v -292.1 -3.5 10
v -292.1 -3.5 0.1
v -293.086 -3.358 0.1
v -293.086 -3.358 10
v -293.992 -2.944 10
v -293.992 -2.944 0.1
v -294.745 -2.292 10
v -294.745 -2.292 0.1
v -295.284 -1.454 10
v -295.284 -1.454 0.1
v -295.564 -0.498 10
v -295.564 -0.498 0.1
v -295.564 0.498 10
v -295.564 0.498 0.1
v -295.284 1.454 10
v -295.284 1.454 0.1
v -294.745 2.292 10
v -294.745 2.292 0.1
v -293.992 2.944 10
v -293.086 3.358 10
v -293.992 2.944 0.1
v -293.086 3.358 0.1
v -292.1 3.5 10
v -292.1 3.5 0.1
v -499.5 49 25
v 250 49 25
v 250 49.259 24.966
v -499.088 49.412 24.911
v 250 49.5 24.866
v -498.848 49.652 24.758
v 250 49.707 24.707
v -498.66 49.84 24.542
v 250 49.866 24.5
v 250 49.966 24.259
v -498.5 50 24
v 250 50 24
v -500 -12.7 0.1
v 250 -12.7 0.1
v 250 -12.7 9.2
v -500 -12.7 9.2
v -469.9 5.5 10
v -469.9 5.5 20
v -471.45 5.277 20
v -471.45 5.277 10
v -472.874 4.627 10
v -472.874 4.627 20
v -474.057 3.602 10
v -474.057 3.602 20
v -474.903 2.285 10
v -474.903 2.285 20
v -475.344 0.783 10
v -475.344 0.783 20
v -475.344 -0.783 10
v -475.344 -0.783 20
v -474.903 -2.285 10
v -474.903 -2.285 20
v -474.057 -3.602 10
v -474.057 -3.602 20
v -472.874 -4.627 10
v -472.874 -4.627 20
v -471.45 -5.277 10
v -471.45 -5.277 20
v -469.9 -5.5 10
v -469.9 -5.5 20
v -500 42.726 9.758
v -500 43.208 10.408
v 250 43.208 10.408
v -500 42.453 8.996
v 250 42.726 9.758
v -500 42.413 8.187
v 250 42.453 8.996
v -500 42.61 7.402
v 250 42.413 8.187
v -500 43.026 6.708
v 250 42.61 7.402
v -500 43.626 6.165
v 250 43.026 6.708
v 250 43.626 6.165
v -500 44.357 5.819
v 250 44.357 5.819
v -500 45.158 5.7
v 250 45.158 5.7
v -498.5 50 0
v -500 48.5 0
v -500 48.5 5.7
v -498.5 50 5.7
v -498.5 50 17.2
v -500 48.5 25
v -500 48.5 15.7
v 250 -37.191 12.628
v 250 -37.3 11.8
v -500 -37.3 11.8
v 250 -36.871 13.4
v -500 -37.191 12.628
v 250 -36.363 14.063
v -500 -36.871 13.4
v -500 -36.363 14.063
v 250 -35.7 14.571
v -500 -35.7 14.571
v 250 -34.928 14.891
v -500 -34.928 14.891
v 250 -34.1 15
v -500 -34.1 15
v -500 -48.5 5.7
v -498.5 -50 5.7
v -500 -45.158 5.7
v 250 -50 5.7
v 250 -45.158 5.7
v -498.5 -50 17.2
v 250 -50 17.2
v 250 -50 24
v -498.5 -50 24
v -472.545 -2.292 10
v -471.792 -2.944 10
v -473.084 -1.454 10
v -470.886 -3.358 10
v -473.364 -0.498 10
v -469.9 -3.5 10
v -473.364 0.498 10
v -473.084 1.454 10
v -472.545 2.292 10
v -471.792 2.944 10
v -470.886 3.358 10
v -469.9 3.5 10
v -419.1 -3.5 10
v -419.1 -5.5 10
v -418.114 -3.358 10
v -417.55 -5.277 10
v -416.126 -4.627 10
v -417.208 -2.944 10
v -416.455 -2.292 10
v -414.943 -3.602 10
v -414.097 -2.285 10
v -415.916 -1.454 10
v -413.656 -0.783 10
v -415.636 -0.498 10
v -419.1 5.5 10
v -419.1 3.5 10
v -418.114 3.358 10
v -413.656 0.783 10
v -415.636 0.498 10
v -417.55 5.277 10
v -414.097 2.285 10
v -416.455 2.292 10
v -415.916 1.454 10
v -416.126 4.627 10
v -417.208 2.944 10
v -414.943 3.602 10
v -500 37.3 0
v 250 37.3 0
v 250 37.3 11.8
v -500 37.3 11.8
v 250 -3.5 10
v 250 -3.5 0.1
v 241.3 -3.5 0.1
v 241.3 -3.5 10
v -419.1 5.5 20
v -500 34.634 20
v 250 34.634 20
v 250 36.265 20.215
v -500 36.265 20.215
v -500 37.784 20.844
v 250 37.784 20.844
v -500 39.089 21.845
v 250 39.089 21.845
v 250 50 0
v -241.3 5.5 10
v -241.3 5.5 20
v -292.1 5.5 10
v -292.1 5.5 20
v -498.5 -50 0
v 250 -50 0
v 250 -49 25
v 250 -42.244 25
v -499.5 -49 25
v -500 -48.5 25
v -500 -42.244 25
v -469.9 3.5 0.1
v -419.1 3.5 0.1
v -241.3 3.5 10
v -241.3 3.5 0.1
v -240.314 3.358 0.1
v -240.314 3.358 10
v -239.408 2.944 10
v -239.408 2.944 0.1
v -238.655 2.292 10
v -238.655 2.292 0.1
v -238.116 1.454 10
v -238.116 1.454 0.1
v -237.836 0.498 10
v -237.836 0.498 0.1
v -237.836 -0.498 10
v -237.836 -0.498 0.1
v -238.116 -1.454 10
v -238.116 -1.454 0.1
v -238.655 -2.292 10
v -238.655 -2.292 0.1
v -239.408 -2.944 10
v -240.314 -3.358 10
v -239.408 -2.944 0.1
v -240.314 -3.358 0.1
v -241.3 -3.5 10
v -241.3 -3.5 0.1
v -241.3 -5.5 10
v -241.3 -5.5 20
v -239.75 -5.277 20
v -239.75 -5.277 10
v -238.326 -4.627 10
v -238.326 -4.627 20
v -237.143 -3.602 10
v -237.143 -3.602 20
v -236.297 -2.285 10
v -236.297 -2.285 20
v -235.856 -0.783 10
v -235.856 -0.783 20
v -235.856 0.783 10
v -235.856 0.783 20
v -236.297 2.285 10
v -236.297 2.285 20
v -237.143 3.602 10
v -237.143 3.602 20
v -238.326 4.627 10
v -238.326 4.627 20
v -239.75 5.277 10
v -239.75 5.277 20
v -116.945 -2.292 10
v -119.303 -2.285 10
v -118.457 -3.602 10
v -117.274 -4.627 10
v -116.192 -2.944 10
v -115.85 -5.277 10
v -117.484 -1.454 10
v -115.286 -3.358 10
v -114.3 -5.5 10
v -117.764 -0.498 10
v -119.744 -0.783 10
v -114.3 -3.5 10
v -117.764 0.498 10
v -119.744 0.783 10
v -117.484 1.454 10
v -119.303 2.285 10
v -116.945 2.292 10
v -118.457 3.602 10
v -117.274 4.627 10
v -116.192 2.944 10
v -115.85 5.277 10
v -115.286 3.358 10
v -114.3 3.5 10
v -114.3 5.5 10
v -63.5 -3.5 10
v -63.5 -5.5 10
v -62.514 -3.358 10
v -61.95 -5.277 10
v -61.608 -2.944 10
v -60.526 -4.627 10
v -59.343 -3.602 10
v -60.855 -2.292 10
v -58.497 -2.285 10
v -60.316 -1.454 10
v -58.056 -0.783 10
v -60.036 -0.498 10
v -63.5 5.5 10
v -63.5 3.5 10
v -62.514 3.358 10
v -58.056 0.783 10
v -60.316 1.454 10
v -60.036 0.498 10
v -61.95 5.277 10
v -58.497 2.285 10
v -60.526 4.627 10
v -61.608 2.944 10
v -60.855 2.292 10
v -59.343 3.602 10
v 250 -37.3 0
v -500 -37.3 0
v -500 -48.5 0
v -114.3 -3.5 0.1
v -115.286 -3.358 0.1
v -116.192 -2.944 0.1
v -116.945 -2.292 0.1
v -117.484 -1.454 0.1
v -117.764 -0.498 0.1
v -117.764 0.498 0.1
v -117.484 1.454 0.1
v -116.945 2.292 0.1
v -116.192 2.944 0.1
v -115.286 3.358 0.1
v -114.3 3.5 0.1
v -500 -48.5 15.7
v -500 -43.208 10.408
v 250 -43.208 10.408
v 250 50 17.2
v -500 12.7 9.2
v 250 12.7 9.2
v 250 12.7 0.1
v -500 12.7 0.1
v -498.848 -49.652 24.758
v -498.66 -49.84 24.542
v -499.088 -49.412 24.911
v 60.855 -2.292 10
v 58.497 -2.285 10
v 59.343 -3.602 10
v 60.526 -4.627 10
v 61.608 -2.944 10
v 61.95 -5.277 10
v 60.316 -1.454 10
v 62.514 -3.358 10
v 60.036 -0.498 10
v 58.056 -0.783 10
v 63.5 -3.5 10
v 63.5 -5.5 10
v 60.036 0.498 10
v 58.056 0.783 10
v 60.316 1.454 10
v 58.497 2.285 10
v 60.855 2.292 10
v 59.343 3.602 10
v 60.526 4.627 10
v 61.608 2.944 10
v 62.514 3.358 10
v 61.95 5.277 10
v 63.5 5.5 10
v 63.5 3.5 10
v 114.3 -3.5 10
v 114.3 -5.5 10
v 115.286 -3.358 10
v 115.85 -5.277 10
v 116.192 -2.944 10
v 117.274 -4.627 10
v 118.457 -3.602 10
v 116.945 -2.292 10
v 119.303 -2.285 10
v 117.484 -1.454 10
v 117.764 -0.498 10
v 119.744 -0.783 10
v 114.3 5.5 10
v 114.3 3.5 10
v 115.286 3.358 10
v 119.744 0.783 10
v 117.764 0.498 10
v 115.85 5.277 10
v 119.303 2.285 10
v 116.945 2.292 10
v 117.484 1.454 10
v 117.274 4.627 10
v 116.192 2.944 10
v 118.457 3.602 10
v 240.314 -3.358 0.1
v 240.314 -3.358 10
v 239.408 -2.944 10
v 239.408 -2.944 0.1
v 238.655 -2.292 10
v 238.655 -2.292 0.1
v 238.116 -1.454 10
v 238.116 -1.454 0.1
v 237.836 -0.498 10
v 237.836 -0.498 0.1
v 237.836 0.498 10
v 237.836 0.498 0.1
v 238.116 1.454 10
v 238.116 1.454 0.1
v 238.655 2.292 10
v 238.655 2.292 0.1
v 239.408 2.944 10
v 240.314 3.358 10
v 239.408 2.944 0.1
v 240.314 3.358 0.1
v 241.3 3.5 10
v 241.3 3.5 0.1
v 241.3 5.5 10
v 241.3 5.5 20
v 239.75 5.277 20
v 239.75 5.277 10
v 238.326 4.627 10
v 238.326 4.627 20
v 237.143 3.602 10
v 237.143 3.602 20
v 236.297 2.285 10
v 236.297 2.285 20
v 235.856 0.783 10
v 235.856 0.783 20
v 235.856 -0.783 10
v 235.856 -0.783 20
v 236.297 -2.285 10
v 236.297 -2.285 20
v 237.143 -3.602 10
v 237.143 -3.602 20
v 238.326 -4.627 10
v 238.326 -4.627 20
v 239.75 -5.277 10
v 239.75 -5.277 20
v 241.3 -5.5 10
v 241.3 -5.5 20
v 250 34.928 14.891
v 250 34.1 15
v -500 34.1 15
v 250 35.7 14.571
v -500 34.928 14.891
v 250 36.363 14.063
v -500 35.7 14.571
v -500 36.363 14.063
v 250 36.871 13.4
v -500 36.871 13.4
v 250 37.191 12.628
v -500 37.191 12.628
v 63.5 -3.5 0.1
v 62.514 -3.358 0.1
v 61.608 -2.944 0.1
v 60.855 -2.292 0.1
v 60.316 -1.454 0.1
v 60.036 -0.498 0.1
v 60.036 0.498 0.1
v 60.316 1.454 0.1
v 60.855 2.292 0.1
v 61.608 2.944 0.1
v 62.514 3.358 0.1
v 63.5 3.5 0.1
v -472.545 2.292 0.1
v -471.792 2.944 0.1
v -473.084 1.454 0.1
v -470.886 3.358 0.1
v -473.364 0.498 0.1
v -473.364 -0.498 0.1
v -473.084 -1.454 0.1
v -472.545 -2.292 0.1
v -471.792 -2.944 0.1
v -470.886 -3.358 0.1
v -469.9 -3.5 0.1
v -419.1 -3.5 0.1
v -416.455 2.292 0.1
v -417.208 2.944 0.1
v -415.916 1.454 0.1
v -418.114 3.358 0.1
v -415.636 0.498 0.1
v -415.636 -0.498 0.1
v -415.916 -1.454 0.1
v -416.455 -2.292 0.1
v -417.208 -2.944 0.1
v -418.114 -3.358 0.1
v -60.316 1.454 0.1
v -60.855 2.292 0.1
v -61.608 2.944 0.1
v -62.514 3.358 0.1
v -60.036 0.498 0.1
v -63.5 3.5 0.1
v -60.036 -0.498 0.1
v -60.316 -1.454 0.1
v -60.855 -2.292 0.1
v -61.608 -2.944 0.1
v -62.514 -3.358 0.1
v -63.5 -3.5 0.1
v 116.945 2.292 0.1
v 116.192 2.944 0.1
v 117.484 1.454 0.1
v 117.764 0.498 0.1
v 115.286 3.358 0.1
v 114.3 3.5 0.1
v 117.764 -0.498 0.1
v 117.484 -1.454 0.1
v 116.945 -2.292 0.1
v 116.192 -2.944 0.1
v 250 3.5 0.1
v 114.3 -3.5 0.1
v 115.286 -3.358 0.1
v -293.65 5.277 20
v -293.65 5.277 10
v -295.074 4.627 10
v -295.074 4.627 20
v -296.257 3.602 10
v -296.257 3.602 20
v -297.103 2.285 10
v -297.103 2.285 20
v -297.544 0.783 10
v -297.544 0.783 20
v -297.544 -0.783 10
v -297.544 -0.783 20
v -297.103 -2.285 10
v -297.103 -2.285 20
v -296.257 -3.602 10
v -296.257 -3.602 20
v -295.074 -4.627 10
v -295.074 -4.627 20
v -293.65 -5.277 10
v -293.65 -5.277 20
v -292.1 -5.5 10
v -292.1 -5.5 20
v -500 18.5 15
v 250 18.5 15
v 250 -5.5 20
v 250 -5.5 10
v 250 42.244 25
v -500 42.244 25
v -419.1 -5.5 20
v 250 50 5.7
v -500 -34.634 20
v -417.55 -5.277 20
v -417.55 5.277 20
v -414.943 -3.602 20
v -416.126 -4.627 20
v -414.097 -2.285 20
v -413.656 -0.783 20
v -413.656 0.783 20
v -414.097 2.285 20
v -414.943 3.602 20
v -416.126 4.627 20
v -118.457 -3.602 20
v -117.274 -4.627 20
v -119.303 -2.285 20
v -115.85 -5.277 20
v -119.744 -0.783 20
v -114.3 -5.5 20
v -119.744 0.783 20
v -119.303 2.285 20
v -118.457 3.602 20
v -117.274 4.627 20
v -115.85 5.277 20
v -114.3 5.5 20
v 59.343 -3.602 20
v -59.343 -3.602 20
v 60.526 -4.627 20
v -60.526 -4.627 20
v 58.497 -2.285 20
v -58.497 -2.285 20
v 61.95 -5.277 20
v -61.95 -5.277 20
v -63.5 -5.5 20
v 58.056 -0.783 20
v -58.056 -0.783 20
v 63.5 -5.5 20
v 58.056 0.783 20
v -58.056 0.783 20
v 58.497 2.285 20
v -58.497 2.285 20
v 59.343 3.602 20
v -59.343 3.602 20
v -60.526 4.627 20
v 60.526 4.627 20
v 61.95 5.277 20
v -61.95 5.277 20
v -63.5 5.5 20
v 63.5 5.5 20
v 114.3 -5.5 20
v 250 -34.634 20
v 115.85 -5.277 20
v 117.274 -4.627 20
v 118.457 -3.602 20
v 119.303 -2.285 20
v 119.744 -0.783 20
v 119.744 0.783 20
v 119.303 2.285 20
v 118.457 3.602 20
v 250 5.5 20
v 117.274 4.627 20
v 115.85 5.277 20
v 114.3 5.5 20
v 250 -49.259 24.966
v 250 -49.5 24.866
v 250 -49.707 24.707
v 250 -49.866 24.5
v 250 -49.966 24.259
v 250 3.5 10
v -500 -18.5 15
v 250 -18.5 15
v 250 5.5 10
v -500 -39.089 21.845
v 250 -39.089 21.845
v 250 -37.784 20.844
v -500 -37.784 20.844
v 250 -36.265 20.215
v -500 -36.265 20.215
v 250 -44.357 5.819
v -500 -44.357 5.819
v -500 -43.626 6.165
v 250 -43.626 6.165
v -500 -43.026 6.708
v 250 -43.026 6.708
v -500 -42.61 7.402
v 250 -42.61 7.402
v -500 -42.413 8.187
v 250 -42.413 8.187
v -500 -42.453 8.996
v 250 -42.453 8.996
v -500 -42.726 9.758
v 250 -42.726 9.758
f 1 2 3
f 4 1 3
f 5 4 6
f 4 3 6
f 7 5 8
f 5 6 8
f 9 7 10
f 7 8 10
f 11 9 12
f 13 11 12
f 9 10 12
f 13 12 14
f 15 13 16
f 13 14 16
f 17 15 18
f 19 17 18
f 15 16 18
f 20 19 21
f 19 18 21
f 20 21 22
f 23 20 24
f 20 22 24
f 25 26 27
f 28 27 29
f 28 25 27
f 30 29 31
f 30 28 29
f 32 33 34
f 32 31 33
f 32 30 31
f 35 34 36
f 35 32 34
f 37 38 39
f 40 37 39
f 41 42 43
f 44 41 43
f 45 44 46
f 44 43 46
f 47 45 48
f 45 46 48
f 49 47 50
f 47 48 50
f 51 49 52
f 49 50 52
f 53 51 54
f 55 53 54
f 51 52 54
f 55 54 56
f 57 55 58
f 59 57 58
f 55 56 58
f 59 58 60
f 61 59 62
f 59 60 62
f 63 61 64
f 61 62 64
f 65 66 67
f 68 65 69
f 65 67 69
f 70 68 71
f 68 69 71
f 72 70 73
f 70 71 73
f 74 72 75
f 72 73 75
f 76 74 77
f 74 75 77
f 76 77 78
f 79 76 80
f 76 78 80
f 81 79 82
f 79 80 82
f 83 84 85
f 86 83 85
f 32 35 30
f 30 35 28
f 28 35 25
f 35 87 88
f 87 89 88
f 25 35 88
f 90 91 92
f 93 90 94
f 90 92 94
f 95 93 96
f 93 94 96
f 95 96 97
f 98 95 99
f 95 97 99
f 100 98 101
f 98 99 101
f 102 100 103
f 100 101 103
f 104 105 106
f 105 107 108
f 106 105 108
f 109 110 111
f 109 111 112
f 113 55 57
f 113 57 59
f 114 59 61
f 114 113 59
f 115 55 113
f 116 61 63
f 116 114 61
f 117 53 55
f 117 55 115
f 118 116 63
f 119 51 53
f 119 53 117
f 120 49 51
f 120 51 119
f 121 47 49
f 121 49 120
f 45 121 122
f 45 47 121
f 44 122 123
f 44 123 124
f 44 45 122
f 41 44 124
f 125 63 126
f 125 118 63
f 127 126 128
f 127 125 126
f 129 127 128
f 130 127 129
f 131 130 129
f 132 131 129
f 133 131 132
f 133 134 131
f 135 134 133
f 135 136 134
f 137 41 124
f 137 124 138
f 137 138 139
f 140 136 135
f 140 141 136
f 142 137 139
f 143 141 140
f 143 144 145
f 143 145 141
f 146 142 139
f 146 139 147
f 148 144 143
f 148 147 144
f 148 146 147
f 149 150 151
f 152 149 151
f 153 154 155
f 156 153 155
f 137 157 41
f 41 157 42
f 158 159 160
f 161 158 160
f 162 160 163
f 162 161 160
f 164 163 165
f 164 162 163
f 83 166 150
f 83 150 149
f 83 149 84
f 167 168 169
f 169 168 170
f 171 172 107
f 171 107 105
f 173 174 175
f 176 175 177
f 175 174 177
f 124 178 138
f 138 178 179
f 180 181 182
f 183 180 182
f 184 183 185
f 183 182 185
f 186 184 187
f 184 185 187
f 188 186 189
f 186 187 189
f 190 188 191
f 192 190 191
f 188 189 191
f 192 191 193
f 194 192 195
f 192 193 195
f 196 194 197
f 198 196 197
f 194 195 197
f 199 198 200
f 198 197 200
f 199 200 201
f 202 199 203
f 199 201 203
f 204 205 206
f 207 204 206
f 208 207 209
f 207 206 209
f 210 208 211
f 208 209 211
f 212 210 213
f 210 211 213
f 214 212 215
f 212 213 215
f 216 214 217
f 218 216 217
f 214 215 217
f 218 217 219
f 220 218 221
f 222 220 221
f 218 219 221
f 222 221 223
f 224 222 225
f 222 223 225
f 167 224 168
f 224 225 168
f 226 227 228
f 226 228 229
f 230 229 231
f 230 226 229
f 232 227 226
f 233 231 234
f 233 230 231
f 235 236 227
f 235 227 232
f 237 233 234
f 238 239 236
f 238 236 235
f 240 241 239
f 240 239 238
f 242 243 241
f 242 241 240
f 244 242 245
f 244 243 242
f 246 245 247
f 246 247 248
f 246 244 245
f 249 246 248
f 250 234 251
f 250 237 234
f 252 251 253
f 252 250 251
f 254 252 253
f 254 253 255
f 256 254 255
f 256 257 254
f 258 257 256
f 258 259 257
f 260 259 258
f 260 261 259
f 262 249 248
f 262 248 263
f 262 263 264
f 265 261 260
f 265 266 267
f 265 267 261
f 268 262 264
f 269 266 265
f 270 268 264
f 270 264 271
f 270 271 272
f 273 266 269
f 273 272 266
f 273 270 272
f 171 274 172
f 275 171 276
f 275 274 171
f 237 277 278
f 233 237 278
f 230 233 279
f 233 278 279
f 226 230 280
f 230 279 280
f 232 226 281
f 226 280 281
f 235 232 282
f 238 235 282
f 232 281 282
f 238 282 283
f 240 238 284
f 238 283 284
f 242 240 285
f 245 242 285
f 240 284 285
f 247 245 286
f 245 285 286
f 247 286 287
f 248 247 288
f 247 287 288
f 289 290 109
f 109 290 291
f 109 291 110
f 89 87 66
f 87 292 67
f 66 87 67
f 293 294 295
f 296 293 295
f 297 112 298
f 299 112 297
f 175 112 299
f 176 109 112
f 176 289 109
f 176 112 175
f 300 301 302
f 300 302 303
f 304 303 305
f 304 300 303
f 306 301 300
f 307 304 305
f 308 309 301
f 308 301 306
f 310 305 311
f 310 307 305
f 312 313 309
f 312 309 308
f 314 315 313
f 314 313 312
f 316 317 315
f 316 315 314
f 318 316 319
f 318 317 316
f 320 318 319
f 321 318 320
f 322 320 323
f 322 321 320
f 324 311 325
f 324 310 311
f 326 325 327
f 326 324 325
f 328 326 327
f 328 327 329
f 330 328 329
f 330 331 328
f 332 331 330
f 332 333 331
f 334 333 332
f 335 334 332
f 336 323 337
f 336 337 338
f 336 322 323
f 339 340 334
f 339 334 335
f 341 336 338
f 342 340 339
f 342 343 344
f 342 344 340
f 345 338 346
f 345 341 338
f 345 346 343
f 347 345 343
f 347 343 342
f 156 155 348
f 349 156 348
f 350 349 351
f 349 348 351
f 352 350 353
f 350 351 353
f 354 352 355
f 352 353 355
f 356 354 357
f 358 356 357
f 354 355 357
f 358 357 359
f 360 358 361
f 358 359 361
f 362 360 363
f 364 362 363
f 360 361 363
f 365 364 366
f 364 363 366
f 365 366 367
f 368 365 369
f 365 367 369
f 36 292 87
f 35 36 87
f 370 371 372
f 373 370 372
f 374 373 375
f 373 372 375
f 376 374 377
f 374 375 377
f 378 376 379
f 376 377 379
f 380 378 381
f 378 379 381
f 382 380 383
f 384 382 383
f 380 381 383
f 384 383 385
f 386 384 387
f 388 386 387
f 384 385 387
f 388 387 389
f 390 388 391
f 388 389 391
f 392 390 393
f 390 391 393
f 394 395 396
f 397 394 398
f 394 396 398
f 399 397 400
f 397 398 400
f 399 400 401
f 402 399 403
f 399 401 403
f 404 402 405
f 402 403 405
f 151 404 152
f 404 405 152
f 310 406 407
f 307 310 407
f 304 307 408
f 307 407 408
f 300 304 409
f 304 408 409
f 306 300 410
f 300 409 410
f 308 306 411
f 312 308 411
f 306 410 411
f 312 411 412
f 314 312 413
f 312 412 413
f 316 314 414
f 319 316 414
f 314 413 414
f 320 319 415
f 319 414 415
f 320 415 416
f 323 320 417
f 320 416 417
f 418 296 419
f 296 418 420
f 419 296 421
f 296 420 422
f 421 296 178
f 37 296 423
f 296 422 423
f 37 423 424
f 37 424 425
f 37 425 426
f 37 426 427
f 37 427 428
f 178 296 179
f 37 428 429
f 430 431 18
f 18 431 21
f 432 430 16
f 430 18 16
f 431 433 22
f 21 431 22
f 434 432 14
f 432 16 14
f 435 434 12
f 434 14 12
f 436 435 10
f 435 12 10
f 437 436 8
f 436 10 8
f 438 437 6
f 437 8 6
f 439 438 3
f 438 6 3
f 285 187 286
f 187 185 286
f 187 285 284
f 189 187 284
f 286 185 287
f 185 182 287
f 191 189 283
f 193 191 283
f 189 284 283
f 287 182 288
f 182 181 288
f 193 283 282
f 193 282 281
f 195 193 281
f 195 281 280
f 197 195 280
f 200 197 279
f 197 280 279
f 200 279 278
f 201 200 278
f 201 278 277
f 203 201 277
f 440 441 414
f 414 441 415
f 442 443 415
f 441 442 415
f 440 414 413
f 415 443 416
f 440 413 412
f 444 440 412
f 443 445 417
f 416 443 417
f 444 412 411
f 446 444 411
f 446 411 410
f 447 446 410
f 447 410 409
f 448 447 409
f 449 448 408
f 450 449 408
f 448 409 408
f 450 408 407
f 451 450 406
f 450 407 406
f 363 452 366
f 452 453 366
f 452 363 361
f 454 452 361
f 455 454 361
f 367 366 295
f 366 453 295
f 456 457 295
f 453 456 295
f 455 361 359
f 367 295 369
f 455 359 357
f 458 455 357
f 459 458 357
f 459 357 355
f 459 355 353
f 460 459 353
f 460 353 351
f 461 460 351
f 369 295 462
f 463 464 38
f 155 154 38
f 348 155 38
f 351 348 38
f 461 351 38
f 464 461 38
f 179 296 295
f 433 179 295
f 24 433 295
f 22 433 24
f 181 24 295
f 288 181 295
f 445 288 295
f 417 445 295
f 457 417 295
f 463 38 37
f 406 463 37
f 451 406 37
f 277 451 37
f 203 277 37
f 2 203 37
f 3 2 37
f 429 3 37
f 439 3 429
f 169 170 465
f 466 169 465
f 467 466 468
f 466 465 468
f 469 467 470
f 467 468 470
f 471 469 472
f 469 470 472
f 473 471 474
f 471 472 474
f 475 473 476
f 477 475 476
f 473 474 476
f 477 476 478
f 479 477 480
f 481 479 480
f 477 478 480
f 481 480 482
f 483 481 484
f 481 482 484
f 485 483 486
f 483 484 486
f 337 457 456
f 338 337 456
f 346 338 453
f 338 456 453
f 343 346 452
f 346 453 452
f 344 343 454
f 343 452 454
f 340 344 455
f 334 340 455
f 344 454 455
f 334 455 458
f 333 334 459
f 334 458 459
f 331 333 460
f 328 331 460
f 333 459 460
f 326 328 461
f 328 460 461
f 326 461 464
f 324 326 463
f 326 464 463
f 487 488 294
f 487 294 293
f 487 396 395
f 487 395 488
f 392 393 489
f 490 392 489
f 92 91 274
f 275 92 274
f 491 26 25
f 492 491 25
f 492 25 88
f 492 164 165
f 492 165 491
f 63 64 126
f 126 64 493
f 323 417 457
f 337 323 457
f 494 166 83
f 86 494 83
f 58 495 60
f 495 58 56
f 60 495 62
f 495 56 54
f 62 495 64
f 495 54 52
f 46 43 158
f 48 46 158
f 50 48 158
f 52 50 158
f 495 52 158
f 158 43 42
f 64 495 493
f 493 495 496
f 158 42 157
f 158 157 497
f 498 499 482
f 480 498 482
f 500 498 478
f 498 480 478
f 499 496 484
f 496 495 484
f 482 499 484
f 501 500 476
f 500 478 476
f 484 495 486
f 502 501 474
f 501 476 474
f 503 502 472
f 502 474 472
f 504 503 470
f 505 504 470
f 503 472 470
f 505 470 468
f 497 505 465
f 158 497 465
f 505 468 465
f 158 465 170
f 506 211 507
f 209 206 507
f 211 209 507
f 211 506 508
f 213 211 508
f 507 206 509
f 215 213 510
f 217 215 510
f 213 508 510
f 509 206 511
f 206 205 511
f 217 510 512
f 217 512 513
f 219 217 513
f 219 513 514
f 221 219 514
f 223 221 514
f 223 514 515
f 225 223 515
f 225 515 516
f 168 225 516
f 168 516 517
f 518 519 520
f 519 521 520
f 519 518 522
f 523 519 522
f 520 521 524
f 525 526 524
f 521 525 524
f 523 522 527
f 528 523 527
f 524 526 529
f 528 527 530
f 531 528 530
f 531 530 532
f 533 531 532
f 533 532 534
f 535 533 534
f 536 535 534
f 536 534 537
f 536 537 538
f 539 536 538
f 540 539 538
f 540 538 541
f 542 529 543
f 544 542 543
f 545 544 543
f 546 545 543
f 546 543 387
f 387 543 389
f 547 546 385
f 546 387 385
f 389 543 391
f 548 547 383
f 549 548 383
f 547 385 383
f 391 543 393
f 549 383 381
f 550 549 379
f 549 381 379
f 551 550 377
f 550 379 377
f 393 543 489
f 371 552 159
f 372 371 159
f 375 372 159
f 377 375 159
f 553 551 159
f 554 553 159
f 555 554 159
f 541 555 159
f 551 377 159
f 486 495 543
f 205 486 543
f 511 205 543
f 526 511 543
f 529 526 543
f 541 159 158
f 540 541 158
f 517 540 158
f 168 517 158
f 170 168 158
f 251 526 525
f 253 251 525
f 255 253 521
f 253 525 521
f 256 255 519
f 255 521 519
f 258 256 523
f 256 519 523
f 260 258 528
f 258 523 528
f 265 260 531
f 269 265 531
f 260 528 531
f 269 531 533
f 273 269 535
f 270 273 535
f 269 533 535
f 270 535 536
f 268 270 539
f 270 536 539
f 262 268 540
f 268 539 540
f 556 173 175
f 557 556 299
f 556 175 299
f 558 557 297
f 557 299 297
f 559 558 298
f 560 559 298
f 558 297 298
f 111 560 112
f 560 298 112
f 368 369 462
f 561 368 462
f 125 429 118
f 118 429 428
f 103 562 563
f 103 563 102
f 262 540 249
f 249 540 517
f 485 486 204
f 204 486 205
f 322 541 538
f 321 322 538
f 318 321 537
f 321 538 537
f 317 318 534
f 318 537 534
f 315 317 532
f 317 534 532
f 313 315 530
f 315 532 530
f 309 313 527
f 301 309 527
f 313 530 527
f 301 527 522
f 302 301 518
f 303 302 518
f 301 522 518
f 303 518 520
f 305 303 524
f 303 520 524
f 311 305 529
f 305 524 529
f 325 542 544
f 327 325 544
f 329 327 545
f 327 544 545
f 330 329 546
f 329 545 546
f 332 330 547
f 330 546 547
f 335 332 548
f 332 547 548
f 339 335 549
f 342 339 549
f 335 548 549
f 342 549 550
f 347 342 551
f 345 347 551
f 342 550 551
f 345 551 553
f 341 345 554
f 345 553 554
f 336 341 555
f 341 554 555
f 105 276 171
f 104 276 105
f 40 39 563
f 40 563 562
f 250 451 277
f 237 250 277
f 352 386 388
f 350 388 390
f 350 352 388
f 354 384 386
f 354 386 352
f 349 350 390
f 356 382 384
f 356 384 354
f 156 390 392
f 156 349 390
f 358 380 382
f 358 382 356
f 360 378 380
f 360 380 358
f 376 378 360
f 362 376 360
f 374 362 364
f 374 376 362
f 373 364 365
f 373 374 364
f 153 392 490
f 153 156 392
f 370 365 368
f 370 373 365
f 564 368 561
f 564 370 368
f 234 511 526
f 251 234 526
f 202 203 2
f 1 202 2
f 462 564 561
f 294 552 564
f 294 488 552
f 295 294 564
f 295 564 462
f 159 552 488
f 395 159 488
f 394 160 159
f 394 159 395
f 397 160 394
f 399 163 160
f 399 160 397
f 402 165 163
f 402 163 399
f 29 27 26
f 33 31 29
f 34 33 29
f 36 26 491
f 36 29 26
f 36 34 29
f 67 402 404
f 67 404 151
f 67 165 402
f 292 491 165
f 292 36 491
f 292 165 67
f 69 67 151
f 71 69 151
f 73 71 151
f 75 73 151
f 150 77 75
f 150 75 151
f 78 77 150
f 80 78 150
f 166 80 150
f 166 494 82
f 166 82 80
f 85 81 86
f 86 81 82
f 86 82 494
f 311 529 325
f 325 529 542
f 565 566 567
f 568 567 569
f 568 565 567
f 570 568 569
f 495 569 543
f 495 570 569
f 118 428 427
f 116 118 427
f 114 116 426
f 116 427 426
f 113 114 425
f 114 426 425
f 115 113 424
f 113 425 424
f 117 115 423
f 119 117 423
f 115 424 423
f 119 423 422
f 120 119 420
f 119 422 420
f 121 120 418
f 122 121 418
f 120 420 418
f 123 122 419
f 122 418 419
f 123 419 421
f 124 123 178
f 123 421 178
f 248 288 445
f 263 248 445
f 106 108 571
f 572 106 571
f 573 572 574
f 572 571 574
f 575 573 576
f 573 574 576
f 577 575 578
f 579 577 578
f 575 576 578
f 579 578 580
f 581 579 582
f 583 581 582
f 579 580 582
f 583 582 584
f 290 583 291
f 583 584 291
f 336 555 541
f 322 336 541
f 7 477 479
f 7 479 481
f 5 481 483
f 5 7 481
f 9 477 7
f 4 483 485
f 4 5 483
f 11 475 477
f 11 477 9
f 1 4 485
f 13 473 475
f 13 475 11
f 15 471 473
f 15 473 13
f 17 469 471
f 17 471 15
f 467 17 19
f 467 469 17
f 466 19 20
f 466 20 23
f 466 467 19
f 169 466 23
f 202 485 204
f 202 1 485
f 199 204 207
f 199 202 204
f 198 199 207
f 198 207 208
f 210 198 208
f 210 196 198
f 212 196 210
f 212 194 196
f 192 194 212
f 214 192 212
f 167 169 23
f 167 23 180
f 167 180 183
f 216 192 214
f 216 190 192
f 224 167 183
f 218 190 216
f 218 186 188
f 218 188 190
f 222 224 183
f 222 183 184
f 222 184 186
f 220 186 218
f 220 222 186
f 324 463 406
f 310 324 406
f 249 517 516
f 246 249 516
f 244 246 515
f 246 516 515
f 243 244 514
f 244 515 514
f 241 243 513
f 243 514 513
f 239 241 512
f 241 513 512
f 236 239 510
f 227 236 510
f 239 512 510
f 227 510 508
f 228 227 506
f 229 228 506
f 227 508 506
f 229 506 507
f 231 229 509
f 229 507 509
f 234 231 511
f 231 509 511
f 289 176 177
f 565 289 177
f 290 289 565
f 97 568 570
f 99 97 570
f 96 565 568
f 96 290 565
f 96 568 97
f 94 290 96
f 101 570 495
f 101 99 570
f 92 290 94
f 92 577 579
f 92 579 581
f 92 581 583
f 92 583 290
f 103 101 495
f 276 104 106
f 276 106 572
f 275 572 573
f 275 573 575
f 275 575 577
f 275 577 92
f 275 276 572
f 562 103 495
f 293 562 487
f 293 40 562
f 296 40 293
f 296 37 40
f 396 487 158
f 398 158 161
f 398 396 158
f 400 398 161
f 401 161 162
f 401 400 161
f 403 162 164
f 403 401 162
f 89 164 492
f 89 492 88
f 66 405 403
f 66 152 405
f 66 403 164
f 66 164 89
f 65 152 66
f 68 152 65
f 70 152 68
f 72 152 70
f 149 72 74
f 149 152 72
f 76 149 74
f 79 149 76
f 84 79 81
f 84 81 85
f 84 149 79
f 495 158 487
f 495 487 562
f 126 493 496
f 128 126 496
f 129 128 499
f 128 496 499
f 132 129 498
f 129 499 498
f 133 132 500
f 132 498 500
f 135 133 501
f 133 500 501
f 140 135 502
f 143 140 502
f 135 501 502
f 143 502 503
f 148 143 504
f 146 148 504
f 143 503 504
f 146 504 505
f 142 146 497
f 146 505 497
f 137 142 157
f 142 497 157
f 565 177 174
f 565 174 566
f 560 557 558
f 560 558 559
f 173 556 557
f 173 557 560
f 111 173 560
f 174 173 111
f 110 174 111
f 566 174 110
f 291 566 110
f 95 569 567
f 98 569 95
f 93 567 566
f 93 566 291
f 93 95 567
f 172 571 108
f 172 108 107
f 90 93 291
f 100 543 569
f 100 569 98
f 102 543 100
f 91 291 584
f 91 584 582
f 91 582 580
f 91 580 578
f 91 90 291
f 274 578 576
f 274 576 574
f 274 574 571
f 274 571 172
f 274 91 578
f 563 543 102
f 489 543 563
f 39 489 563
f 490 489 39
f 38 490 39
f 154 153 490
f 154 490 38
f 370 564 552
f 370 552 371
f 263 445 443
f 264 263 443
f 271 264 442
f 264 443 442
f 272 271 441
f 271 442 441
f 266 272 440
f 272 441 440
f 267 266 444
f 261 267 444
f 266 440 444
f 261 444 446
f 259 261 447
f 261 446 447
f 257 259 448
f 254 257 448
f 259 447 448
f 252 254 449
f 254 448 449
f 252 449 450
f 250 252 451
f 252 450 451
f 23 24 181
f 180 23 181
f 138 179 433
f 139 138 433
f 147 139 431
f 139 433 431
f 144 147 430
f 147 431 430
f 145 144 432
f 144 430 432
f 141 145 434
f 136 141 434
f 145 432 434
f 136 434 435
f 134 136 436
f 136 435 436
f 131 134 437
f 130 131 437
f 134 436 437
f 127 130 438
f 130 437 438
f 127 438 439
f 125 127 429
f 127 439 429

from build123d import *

# Parameters (mm, degrees)
SKETCH1_W           = 1000
SKETCH1_H           = 100
BOSS_EXTRUDE1_DEPTH = 25
CUT_EXTRUDE1_DEPTH  = 1002.561281201
CUT_EXTRUDE2_DEPTH  = 1002.561281201
CUT_EXTRUDE3_DEPTH  = 1002.561281201
CUT_EXTRUDE4_DEPTH  = 1002.561281201
CUT_EXTRUDE5_DEPTH  = 10
CUT_EXTRUDE6_DEPTH  = 504.110335811
CUT_EXTRUDE7_DEPTH  = 10
CUT_EXTRUDE8_DEPTH  = 504.110335811
CUT_EXTRUDE9_DEPTH  = 10
CUT_EXTRUDE10_DEPTH = 504.110335811
CUT_EXTRUDE11_DEPTH = 10
CUT_EXTRUDE12_DEPTH = 504.110335811
CUT_EXTRUDE13_DEPTH = 10
CUT_EXTRUDE14_DEPTH = 504.110335811
CUT_EXTRUDE15_DEPTH = 10
CUT_EXTRUDE16_DEPTH = 504.110335811
CHAMFER1_SIZE       = 5.8
CHAMFER2_SIZE       = 1.5
FILLET1_R           = 1
FILLET2_R           = 3.2
FILLET3_R           = 6.3
CUT_EXTRUDE17_START = -250
CUT_EXTRUDE17_DEPTH = 250


with BuildPart() as part:
    # Sketch1 → Boss-Extrude1 (new body)
    with BuildSketch(Plane(origin=(0, 0, 0), x_dir=(-1, 0, 0), z_dir=(0, 0, -1))):
        Rectangle(SKETCH1_W, SKETCH1_H)
    extrude(amount=-BOSS_EXTRUDE1_DEPTH)

    # Sketch2 → Cut-Extrude1 (cut, through all)
    with BuildSketch(Plane(origin=(500, 0, 0), x_dir=(0, 0, -1), z_dir=(1, 0, 0))):
        Polygon((0, 37.3), (-15, 37.3), (-15, 12.7), (-0.1, 12.7), (-0.1, -12.7), (-15, -12.7), (-15, -37.3), (0, -37.3), align=None)
    extrude(amount=-CUT_EXTRUDE1_DEPTH, mode=Mode.SUBTRACT)

    # Sketch3 → Cut-Extrude2 (cut, through all)
    with BuildSketch(Plane(origin=(500, 0, 0), x_dir=(0, 0, -1), z_dir=(1, 0, 0))):
        with BuildLine():
            Line((-17.2, -50), (-5.7, -50))
            Line((-5.7, -50), (-5.7, -45.157716447))
            ThreePointArc((-5.7, -45.157716447), (-7.402384051, -42.609918665), (-10.407716447, -43.207716447))
            Line((-10.407716447, -43.207716447), (-17.2, -50))
        make_face()
    extrude(amount=-CUT_EXTRUDE2_DEPTH, mode=Mode.SUBTRACT)

    # Sketch4 → Cut-Extrude3 (cut, through all)
    with BuildSketch(Plane(origin=(500, 0, 0), x_dir=(0, 0, -1), z_dir=(1, 0, 0))):
        Polygon((-25, -42.243650814), (-20, -37.243650814), (-20, 37.243650814), (-25, 42.243650814), align=None)
    extrude(amount=-CUT_EXTRUDE3_DEPTH, mode=Mode.SUBTRACT)

    # Sketch5 → Cut-Extrude4 (cut, through all)
    with BuildSketch(Plane(origin=(500, 0, 0), x_dir=(0, 0, -1), z_dir=(1, 0, 0))):
        with BuildLine():
            Line((-5.7, 50), (-17.2, 50))
            Line((-17.2, 50), (-10.407716447, 43.207716447))
            ThreePointArc((-10.407716447, 43.207716447), (-7.402384051, 42.609918665), (-5.7, 45.157716447))
            Line((-5.7, 45.157716447), (-5.7, 50))
        make_face()
    extrude(amount=-CUT_EXTRUDE4_DEPTH, mode=Mode.SUBTRACT)

    # Sketch6 → Cut-Extrude5 (cut)
    with BuildSketch(Plane.XY.offset(20)):
        with BuildLine():
            Line((419.1, -5.5), (469.9, -5.5))
            ThreePointArc((469.9, -5.5), (475.4, 0), (469.9, 5.5))
            Line((469.9, 5.5), (419.1, 5.5))
            ThreePointArc((419.1, 5.5), (413.6, 0), (419.1, -5.5))
        make_face()
    extrude(amount=-CUT_EXTRUDE5_DEPTH, mode=Mode.SUBTRACT)

    # Sketch7 → Cut-Extrude6 (cut, through all)
    with BuildSketch(Plane(origin=(0, 0, 0.1), x_dir=(-1, 0, 0), z_dir=(0, 0, -1))):
        with BuildLine():
            Line((-469.9, -3.5), (-419.1, -3.5))
            ThreePointArc((-419.1, -3.5), (-415.6, 0), (-419.1, 3.5))
            Line((-419.1, 3.5), (-469.9, 3.5))
            ThreePointArc((-469.9, 3.5), (-473.4, 0), (-469.9, -3.5))
        make_face()
    extrude(amount=-CUT_EXTRUDE6_DEPTH, mode=Mode.SUBTRACT)

    # Sketch8 → Cut-Extrude7 (cut)
    with BuildSketch(Plane.XY.offset(20)):
        with BuildLine():
            Line((241.3, -5.5), (292.1, -5.5))
            ThreePointArc((292.1, -5.5), (297.6, 0), (292.1, 5.5))
            Line((292.1, 5.5), (241.3, 5.5))
            ThreePointArc((241.3, 5.5), (235.8, 0), (241.3, -5.5))
        make_face()
    extrude(amount=-CUT_EXTRUDE7_DEPTH, mode=Mode.SUBTRACT)

    # Sketch9 → Cut-Extrude8 (cut, through all)
    with BuildSketch(Plane(origin=(0, 0, 0.1), x_dir=(-1, 0, 0), z_dir=(0, 0, -1))):
        with BuildLine():
            Line((-292.1, -3.5), (-241.3, -3.5))
            ThreePointArc((-241.3, -3.5), (-237.8, 0), (-241.3, 3.5))
            Line((-241.3, 3.5), (-292.1, 3.5))
            ThreePointArc((-292.1, 3.5), (-295.6, 0), (-292.1, -3.5))
        make_face()
    extrude(amount=-CUT_EXTRUDE8_DEPTH, mode=Mode.SUBTRACT)

    # Sketch10 → Cut-Extrude9 (cut)
    with BuildSketch(Plane.XY.offset(20)):
        with BuildLine():
            Line((63.5, -5.5), (114.3, -5.5))
            ThreePointArc((114.3, -5.5), (119.8, 0), (114.3, 5.5))
            Line((114.3, 5.5), (63.5, 5.5))
            ThreePointArc((63.5, 5.5), (58, 0), (63.5, -5.5))
        make_face()
    extrude(amount=-CUT_EXTRUDE9_DEPTH, mode=Mode.SUBTRACT)

    # Sketch11 → Cut-Extrude10 (cut, through all)
    with BuildSketch(Plane(origin=(0, 0, 0.1), x_dir=(-1, 0, 0), z_dir=(0, 0, -1))):
        with BuildLine():
            Line((-114.3, -3.5), (-63.5, -3.5))
            ThreePointArc((-63.5, -3.5), (-60, 0), (-63.5, 3.5))
            Line((-63.5, 3.5), (-114.3, 3.5))
            ThreePointArc((-114.3, 3.5), (-117.8, 0), (-114.3, -3.5))
        make_face()
    extrude(amount=-CUT_EXTRUDE10_DEPTH, mode=Mode.SUBTRACT)

    # Sketch12 → Cut-Extrude11 (cut)
    with BuildSketch(Plane.XY.offset(20)):
        with BuildLine():
            Line((-114.3, -5.5), (-63.5, -5.5))
            ThreePointArc((-63.5, -5.5), (-58, 0), (-63.5, 5.5))
            Line((-63.5, 5.5), (-114.3, 5.5))
            ThreePointArc((-114.3, 5.5), (-119.8, 0), (-114.3, -5.5))
        make_face()
    extrude(amount=-CUT_EXTRUDE11_DEPTH, mode=Mode.SUBTRACT)

    # Sketch13 → Cut-Extrude12 (cut, through all)
    with BuildSketch(Plane(origin=(0, 0, 0.1), x_dir=(-1, 0, 0), z_dir=(0, 0, -1))):
        with BuildLine():
            Line((63.5, -3.5), (114.3, -3.5))
            ThreePointArc((114.3, -3.5), (117.8, 0), (114.3, 3.5))
            Line((114.3, 3.5), (63.5, 3.5))
            ThreePointArc((63.5, 3.5), (60, 0), (63.5, -3.5))
        make_face()
    extrude(amount=-CUT_EXTRUDE12_DEPTH, mode=Mode.SUBTRACT)

    # Sketch14 → Cut-Extrude13 (cut)
    with BuildSketch(Plane.XY.offset(20)):
        with BuildLine():
            Line((-292.1, -5.5), (-241.3, -5.5))
            ThreePointArc((-241.3, -5.5), (-235.8, 0), (-241.3, 5.5))
            Line((-241.3, 5.5), (-292.1, 5.5))
            ThreePointArc((-292.1, 5.5), (-297.6, 0), (-292.1, -5.5))
        make_face()
    extrude(amount=-CUT_EXTRUDE13_DEPTH, mode=Mode.SUBTRACT)

    # Sketch15 → Cut-Extrude14 (cut, through all)
    with BuildSketch(Plane(origin=(0, 0, 0.1), x_dir=(-1, 0, 0), z_dir=(0, 0, -1))):
        with BuildLine():
            Line((241.3, -3.5), (292.1, -3.5))
            ThreePointArc((292.1, -3.5), (295.6, 0), (292.1, 3.5))
            Line((292.1, 3.5), (241.3, 3.5))
            ThreePointArc((241.3, 3.5), (237.8, 0), (241.3, -3.5))
        make_face()
    extrude(amount=-CUT_EXTRUDE14_DEPTH, mode=Mode.SUBTRACT)

    # Sketch16 → Cut-Extrude15 (cut)
    with BuildSketch(Plane.XY.offset(20)):
        with BuildLine():
            Line((-469.9, -5.5), (-419.1, -5.5))
            ThreePointArc((-419.1, -5.5), (-413.6, 0), (-419.1, 5.5))
            Line((-419.1, 5.5), (-469.9, 5.5))
            ThreePointArc((-469.9, 5.5), (-475.4, 0), (-469.9, -5.5))
        make_face()
    extrude(amount=-CUT_EXTRUDE15_DEPTH, mode=Mode.SUBTRACT)

    # Sketch17 → Cut-Extrude16 (cut, through all)
    with BuildSketch(Plane(origin=(0, 0, 0.1), x_dir=(-1, 0, 0), z_dir=(0, 0, -1))):
        with BuildLine():
            Line((419.1, -3.5), (469.9, -3.5))
            ThreePointArc((469.9, -3.5), (473.4, 0), (469.9, 3.5))
            Line((469.9, 3.5), (419.1, 3.5))
            ThreePointArc((419.1, 3.5), (415.6, 0), (419.1, -3.5))
        make_face()
    extrude(amount=-CUT_EXTRUDE16_DEPTH, mode=Mode.SUBTRACT)

    # Chamfer1
    chamfer1_edges = [part.edges().sort_by_distance(p)[0] for p in [
        (0, -12.7, 15),
        (0, 12.7, 15),
    ]]
    chamfer(chamfer1_edges, length=CHAMFER1_SIZE)

    # Chamfer2
    chamfer2_edges = [part.edges().sort_by_distance(p)[0] for p in [
        (500, -50, 2.85),
        (-500, -50, 2.85),
        (-500, 50, 21.1),
        (-500, -50, 21.1),
        (500, -50, 21.1),
        (500, 50, 2.85),
        (500, 50, 21.1),
        (-500, 50, 2.85),
    ]]
    chamfer(chamfer2_edges, length=CHAMFER2_SIZE)

    # Fillet1
    fillet1_edges = [part.edges().sort_by_distance(p)[0] for p in [
        (0, 50, 25),
        (0, -50, 25),
    ]]
    fillet(fillet1_edges, radius=FILLET1_R)

    # Fillet2
    fillet2_edges = [part.edges().sort_by_distance(p)[0] for p in [
        (0, -37.3, 15),
        (0, 37.3, 15),
    ]]
    fillet(fillet2_edges, radius=FILLET2_R)

    # Fillet3
    fillet3_edges = [part.edges().sort_by_distance(p)[0] for p in [
        (0, 37.243650814, 20),
        (0, -37.243650814, 20),
    ]]
    fillet(fillet3_edges, radius=FILLET3_R)

    # Sketch18 → Cut-Extrude17 (cut)
    with BuildSketch(Plane(origin=(500, 0, 0), x_dir=(0, 0, -1), z_dir=(1, 0, 0)).offset(CUT_EXTRUDE17_START)):
        with BuildLine():
            Line((-5.7, 50), (-5.7, 48.5))
            Line((-5.7, 48.5), (-5.7, 45.157716447))
            ThreePointArc((-5.7, 45.157716447), (-7.402384051, 42.609918665), (-10.407716447, 43.207716447))
            Line((-10.407716447, 43.207716447), (-15.7, 48.5))
            Line((-15.7, 48.5), (-17.2, 50))
            Line((-17.2, 50), (-24, 50))
            ThreePointArc((-24, 50), (-24.707106781, 49.707106781), (-25, 49))
            Line((-25, 49), (-25, 48.5))
            Line((-25, 48.5), (-25, 42.243650814))
            Line((-25, 42.243650814), (-21.845227279, 39.088878092))
            ThreePointArc((-21.845227279, 39.088878092), (-20.479558945, 37.045010995), (-20, 34.634105371))
            Line((-20, 34.634105371), (-20, -34.634105371))
            ThreePointArc((-20, -34.634105371), (-20.479558945, -37.045010995), (-21.845227279, -39.088878092))
            Line((-21.845227279, -39.088878092), (-25, -42.243650814))
            Line((-25, -42.243650814), (-25, -48.5))
            Line((-25, -48.5), (-25, -49))
            ThreePointArc((-25, -49), (-24.707106781, -49.707106781), (-24, -50))
            Line((-24, -50), (-17.2, -50))
            Line((-17.2, -50), (-15.7, -48.5))
            Line((-15.7, -48.5), (-10.407716447, -43.207716447))
            ThreePointArc((-10.407716447, -43.207716447), (-7.402384051, -42.609918665), (-5.7, -45.157716447))
            Line((-5.7, -45.157716447), (-5.7, -48.5))
            Line((-5.7, -48.5), (-5.7, -50))
            Line((-5.7, -50), (0, -50))
            Line((0, -50), (0, -48.5))
            Line((0, -48.5), (0, -37.3))
            Line((0, -37.3), (-11.8, -37.3))
            ThreePointArc((-11.8, -37.3), (-14.0627417, -36.3627417), (-15, -34.1))
            Line((-15, -34.1), (-15, -18.5))
            Line((-15, -18.5), (-9.2, -12.7))
            Line((-9.2, -12.7), (-0.1, -12.7))
            Line((-0.1, -12.7), (-0.1, 12.7))
            Line((-0.1, 12.7), (-9.2, 12.7))
            Line((-9.2, 12.7), (-15, 18.5))
            Line((-15, 18.5), (-15, 34.1))
            ThreePointArc((-15, 34.1), (-14.0627417, 36.3627417), (-11.8, 37.3))
            Line((-11.8, 37.3), (0, 37.3))
            Line((0, 37.3), (0, 48.5))
            Line((0, 48.5), (0, 50))
            Line((0, 50), (-5.7, 50))
        make_face()
    extrude(amount=CUT_EXTRUDE17_DEPTH, mode=Mode.SUBTRACT)


solid = part.part
